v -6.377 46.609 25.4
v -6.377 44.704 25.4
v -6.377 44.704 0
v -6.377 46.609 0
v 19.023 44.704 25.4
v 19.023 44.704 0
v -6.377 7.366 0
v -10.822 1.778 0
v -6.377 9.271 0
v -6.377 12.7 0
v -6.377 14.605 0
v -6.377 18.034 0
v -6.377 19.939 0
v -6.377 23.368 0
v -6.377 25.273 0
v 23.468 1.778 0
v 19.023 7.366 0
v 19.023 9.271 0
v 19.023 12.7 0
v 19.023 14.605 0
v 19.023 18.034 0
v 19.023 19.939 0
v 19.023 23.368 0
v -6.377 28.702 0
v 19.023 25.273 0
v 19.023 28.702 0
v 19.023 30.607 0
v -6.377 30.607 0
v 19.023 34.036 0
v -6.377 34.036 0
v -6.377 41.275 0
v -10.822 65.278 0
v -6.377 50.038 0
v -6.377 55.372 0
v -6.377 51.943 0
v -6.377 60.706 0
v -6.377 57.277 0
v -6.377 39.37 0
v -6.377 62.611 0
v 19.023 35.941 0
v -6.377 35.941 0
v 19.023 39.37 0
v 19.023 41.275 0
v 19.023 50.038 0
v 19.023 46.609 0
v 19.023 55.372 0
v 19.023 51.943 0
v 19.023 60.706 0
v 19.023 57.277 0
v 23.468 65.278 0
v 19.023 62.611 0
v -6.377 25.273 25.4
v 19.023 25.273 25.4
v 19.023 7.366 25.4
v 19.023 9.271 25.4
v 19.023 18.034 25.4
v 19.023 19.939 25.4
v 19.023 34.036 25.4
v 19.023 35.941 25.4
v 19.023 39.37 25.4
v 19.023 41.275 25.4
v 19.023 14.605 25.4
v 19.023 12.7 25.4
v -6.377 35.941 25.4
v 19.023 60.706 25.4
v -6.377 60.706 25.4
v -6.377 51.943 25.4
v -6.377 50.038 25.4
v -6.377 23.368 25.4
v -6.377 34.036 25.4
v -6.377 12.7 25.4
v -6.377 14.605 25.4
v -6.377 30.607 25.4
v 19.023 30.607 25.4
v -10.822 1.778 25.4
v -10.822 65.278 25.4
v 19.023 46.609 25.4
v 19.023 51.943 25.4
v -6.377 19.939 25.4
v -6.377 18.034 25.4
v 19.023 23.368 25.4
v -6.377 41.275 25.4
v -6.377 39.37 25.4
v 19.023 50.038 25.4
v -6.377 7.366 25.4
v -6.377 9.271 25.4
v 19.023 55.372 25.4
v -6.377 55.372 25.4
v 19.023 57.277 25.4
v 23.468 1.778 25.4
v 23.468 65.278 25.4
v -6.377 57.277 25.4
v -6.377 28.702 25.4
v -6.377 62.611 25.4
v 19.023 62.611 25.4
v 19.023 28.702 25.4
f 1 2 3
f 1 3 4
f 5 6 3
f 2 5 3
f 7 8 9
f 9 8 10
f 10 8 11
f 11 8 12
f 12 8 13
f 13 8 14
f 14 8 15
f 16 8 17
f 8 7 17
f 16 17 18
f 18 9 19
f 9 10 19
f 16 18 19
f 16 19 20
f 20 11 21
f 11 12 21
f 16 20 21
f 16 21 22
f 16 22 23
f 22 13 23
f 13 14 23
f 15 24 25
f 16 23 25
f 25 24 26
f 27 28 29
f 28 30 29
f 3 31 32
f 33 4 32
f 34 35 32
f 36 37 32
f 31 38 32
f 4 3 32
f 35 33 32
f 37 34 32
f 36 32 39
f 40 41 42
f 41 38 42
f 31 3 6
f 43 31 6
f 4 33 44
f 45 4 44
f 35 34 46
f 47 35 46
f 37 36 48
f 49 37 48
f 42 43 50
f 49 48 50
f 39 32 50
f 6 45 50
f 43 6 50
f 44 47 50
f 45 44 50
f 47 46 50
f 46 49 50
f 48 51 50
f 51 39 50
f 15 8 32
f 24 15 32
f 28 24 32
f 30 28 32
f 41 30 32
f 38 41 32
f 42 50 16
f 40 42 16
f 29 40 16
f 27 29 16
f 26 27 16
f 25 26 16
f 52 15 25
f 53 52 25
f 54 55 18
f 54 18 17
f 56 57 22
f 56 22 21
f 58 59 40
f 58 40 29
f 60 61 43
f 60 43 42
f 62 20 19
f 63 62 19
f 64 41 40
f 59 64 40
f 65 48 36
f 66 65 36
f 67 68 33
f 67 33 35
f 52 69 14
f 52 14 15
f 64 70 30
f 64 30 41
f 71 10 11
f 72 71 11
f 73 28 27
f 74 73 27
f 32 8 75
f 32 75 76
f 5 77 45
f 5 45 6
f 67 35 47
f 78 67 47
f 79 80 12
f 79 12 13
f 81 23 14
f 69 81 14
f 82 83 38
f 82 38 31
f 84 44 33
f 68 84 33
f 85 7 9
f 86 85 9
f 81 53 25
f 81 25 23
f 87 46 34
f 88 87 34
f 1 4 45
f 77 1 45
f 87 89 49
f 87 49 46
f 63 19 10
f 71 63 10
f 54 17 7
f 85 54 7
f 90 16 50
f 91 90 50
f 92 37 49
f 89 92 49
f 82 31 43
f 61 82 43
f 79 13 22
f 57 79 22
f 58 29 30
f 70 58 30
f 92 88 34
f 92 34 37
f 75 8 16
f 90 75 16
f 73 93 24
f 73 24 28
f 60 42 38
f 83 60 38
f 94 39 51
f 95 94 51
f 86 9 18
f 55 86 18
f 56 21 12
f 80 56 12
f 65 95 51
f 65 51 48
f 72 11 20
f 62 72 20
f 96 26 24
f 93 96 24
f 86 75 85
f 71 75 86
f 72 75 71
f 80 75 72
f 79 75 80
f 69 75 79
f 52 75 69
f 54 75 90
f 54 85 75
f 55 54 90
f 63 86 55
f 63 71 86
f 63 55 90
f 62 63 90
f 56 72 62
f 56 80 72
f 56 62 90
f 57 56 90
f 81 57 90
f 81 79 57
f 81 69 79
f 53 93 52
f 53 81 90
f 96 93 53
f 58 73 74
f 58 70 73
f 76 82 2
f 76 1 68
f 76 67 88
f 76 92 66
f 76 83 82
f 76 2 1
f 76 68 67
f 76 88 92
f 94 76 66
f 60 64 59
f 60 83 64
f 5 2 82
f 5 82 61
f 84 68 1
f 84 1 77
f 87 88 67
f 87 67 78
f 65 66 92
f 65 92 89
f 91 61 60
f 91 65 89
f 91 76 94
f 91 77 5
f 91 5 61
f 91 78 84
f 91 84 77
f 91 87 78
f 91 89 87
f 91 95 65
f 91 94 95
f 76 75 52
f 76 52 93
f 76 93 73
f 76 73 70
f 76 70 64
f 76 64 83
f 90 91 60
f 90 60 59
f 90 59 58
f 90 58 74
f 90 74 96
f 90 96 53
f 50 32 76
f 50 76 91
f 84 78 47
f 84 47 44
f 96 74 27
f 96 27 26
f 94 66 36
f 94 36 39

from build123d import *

# Parameters (mm, degrees)
F0_W     = 34.29
F0_H     = 63.5
F1_DEPTH = 25.4


with BuildPart() as f1:
    # F0 (on Top) → F1 (new body)
    with BuildSketch(Plane.XY):
        with Locations((6.322508, 33.528001)):
            Rectangle(F0_W, F0_H)
        Polygon((19.022508, 7.366001), (6.322508, 7.366001), (-6.377492, 7.366001), (-6.377492, 9.271001), (5.6515, 9.271001), (19.022508, 9.271001), align=None, mode=Mode.SUBTRACT)
        Polygon((19.022508, 12.700001), (6.322508, 12.700001), (-6.377492, 12.700001), (-6.377492, 14.605001), (7.876809, 14.605001), (19.022508, 14.605001), align=None, mode=Mode.SUBTRACT)
        Polygon((19.022508, 18.034001), (6.322508, 18.034001), (-6.377492, 18.034001), (-6.377492, 19.939001), (5.6515, 19.939001), (19.022508, 19.939001), align=None, mode=Mode.SUBTRACT)
        Polygon((19.022508, 23.368001), (6.322508, 23.368001), (-6.377492, 23.368001), (-6.377492, 25.273001), (5.6515, 25.273001), (19.022508, 25.273001), align=None, mode=Mode.SUBTRACT)
        Polygon((19.022508, 28.702001), (6.322508, 28.702001), (-6.377492, 28.702001), (-6.377492, 30.607001), (5.6515, 30.607001), (19.022508, 30.607001), align=None, mode=Mode.SUBTRACT)
        Polygon((19.022508, 60.706001), (6.322508, 60.706001), (-6.377492, 60.706001), (-6.377492, 62.611001), (5.6515, 62.611001), (19.022508, 62.611001), align=None, mode=Mode.SUBTRACT)
        Polygon((19.022508, 34.036001), (6.322508, 34.036001), (-6.377492, 34.036001), (-6.377492, 35.941001), (5.6515, 35.941001), (19.022508, 35.941001), align=None, mode=Mode.SUBTRACT)
        Polygon((19.022508, 39.370001), (6.322508, 39.370001), (-6.377492, 39.370001), (-6.377492, 41.275001), (5.6515, 41.275001), (19.022508, 41.275001), align=None, mode=Mode.SUBTRACT)
        Polygon((19.022508, 44.704001), (6.322508, 44.704001), (-6.377492, 44.704001), (-6.377492, 46.609001), (5.6515, 46.609001), (19.022508, 46.609001), align=None, mode=Mode.SUBTRACT)
        Polygon((19.022508, 50.038001), (6.322508, 50.038001), (-6.377492, 50.038001), (-6.377492, 51.943001), (5.6515, 51.943001), (19.022508, 51.943001), align=None, mode=Mode.SUBTRACT)
        Polygon((19.022508, 55.372001), (6.322508, 55.372001), (-6.377492, 55.372001), (-6.377492, 57.277001), (5.6515, 57.277001), (19.022508, 57.277001), align=None, mode=Mode.SUBTRACT)
    extrude(amount=F1_DEPTH)


solid = f1.part
